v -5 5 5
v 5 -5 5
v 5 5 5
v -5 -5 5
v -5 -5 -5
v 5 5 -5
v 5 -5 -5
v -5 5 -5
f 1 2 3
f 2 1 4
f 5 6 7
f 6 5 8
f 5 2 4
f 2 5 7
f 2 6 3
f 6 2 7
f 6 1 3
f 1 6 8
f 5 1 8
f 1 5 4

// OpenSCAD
// file: config.scad
vesc_offset = [0, -14];
vesc_mounting_hole_diameter = 3.5;

plate_mounting_hole_centres = [80, 110];
plate_mounting_hole_diameter = 8;

plate_dimensions = [100, 130];
plate_thickness = 1;
// main file
include <config.scad>

module Clamp()
{
  cube([10, 10, 10], center=true);
}

Clamp();
